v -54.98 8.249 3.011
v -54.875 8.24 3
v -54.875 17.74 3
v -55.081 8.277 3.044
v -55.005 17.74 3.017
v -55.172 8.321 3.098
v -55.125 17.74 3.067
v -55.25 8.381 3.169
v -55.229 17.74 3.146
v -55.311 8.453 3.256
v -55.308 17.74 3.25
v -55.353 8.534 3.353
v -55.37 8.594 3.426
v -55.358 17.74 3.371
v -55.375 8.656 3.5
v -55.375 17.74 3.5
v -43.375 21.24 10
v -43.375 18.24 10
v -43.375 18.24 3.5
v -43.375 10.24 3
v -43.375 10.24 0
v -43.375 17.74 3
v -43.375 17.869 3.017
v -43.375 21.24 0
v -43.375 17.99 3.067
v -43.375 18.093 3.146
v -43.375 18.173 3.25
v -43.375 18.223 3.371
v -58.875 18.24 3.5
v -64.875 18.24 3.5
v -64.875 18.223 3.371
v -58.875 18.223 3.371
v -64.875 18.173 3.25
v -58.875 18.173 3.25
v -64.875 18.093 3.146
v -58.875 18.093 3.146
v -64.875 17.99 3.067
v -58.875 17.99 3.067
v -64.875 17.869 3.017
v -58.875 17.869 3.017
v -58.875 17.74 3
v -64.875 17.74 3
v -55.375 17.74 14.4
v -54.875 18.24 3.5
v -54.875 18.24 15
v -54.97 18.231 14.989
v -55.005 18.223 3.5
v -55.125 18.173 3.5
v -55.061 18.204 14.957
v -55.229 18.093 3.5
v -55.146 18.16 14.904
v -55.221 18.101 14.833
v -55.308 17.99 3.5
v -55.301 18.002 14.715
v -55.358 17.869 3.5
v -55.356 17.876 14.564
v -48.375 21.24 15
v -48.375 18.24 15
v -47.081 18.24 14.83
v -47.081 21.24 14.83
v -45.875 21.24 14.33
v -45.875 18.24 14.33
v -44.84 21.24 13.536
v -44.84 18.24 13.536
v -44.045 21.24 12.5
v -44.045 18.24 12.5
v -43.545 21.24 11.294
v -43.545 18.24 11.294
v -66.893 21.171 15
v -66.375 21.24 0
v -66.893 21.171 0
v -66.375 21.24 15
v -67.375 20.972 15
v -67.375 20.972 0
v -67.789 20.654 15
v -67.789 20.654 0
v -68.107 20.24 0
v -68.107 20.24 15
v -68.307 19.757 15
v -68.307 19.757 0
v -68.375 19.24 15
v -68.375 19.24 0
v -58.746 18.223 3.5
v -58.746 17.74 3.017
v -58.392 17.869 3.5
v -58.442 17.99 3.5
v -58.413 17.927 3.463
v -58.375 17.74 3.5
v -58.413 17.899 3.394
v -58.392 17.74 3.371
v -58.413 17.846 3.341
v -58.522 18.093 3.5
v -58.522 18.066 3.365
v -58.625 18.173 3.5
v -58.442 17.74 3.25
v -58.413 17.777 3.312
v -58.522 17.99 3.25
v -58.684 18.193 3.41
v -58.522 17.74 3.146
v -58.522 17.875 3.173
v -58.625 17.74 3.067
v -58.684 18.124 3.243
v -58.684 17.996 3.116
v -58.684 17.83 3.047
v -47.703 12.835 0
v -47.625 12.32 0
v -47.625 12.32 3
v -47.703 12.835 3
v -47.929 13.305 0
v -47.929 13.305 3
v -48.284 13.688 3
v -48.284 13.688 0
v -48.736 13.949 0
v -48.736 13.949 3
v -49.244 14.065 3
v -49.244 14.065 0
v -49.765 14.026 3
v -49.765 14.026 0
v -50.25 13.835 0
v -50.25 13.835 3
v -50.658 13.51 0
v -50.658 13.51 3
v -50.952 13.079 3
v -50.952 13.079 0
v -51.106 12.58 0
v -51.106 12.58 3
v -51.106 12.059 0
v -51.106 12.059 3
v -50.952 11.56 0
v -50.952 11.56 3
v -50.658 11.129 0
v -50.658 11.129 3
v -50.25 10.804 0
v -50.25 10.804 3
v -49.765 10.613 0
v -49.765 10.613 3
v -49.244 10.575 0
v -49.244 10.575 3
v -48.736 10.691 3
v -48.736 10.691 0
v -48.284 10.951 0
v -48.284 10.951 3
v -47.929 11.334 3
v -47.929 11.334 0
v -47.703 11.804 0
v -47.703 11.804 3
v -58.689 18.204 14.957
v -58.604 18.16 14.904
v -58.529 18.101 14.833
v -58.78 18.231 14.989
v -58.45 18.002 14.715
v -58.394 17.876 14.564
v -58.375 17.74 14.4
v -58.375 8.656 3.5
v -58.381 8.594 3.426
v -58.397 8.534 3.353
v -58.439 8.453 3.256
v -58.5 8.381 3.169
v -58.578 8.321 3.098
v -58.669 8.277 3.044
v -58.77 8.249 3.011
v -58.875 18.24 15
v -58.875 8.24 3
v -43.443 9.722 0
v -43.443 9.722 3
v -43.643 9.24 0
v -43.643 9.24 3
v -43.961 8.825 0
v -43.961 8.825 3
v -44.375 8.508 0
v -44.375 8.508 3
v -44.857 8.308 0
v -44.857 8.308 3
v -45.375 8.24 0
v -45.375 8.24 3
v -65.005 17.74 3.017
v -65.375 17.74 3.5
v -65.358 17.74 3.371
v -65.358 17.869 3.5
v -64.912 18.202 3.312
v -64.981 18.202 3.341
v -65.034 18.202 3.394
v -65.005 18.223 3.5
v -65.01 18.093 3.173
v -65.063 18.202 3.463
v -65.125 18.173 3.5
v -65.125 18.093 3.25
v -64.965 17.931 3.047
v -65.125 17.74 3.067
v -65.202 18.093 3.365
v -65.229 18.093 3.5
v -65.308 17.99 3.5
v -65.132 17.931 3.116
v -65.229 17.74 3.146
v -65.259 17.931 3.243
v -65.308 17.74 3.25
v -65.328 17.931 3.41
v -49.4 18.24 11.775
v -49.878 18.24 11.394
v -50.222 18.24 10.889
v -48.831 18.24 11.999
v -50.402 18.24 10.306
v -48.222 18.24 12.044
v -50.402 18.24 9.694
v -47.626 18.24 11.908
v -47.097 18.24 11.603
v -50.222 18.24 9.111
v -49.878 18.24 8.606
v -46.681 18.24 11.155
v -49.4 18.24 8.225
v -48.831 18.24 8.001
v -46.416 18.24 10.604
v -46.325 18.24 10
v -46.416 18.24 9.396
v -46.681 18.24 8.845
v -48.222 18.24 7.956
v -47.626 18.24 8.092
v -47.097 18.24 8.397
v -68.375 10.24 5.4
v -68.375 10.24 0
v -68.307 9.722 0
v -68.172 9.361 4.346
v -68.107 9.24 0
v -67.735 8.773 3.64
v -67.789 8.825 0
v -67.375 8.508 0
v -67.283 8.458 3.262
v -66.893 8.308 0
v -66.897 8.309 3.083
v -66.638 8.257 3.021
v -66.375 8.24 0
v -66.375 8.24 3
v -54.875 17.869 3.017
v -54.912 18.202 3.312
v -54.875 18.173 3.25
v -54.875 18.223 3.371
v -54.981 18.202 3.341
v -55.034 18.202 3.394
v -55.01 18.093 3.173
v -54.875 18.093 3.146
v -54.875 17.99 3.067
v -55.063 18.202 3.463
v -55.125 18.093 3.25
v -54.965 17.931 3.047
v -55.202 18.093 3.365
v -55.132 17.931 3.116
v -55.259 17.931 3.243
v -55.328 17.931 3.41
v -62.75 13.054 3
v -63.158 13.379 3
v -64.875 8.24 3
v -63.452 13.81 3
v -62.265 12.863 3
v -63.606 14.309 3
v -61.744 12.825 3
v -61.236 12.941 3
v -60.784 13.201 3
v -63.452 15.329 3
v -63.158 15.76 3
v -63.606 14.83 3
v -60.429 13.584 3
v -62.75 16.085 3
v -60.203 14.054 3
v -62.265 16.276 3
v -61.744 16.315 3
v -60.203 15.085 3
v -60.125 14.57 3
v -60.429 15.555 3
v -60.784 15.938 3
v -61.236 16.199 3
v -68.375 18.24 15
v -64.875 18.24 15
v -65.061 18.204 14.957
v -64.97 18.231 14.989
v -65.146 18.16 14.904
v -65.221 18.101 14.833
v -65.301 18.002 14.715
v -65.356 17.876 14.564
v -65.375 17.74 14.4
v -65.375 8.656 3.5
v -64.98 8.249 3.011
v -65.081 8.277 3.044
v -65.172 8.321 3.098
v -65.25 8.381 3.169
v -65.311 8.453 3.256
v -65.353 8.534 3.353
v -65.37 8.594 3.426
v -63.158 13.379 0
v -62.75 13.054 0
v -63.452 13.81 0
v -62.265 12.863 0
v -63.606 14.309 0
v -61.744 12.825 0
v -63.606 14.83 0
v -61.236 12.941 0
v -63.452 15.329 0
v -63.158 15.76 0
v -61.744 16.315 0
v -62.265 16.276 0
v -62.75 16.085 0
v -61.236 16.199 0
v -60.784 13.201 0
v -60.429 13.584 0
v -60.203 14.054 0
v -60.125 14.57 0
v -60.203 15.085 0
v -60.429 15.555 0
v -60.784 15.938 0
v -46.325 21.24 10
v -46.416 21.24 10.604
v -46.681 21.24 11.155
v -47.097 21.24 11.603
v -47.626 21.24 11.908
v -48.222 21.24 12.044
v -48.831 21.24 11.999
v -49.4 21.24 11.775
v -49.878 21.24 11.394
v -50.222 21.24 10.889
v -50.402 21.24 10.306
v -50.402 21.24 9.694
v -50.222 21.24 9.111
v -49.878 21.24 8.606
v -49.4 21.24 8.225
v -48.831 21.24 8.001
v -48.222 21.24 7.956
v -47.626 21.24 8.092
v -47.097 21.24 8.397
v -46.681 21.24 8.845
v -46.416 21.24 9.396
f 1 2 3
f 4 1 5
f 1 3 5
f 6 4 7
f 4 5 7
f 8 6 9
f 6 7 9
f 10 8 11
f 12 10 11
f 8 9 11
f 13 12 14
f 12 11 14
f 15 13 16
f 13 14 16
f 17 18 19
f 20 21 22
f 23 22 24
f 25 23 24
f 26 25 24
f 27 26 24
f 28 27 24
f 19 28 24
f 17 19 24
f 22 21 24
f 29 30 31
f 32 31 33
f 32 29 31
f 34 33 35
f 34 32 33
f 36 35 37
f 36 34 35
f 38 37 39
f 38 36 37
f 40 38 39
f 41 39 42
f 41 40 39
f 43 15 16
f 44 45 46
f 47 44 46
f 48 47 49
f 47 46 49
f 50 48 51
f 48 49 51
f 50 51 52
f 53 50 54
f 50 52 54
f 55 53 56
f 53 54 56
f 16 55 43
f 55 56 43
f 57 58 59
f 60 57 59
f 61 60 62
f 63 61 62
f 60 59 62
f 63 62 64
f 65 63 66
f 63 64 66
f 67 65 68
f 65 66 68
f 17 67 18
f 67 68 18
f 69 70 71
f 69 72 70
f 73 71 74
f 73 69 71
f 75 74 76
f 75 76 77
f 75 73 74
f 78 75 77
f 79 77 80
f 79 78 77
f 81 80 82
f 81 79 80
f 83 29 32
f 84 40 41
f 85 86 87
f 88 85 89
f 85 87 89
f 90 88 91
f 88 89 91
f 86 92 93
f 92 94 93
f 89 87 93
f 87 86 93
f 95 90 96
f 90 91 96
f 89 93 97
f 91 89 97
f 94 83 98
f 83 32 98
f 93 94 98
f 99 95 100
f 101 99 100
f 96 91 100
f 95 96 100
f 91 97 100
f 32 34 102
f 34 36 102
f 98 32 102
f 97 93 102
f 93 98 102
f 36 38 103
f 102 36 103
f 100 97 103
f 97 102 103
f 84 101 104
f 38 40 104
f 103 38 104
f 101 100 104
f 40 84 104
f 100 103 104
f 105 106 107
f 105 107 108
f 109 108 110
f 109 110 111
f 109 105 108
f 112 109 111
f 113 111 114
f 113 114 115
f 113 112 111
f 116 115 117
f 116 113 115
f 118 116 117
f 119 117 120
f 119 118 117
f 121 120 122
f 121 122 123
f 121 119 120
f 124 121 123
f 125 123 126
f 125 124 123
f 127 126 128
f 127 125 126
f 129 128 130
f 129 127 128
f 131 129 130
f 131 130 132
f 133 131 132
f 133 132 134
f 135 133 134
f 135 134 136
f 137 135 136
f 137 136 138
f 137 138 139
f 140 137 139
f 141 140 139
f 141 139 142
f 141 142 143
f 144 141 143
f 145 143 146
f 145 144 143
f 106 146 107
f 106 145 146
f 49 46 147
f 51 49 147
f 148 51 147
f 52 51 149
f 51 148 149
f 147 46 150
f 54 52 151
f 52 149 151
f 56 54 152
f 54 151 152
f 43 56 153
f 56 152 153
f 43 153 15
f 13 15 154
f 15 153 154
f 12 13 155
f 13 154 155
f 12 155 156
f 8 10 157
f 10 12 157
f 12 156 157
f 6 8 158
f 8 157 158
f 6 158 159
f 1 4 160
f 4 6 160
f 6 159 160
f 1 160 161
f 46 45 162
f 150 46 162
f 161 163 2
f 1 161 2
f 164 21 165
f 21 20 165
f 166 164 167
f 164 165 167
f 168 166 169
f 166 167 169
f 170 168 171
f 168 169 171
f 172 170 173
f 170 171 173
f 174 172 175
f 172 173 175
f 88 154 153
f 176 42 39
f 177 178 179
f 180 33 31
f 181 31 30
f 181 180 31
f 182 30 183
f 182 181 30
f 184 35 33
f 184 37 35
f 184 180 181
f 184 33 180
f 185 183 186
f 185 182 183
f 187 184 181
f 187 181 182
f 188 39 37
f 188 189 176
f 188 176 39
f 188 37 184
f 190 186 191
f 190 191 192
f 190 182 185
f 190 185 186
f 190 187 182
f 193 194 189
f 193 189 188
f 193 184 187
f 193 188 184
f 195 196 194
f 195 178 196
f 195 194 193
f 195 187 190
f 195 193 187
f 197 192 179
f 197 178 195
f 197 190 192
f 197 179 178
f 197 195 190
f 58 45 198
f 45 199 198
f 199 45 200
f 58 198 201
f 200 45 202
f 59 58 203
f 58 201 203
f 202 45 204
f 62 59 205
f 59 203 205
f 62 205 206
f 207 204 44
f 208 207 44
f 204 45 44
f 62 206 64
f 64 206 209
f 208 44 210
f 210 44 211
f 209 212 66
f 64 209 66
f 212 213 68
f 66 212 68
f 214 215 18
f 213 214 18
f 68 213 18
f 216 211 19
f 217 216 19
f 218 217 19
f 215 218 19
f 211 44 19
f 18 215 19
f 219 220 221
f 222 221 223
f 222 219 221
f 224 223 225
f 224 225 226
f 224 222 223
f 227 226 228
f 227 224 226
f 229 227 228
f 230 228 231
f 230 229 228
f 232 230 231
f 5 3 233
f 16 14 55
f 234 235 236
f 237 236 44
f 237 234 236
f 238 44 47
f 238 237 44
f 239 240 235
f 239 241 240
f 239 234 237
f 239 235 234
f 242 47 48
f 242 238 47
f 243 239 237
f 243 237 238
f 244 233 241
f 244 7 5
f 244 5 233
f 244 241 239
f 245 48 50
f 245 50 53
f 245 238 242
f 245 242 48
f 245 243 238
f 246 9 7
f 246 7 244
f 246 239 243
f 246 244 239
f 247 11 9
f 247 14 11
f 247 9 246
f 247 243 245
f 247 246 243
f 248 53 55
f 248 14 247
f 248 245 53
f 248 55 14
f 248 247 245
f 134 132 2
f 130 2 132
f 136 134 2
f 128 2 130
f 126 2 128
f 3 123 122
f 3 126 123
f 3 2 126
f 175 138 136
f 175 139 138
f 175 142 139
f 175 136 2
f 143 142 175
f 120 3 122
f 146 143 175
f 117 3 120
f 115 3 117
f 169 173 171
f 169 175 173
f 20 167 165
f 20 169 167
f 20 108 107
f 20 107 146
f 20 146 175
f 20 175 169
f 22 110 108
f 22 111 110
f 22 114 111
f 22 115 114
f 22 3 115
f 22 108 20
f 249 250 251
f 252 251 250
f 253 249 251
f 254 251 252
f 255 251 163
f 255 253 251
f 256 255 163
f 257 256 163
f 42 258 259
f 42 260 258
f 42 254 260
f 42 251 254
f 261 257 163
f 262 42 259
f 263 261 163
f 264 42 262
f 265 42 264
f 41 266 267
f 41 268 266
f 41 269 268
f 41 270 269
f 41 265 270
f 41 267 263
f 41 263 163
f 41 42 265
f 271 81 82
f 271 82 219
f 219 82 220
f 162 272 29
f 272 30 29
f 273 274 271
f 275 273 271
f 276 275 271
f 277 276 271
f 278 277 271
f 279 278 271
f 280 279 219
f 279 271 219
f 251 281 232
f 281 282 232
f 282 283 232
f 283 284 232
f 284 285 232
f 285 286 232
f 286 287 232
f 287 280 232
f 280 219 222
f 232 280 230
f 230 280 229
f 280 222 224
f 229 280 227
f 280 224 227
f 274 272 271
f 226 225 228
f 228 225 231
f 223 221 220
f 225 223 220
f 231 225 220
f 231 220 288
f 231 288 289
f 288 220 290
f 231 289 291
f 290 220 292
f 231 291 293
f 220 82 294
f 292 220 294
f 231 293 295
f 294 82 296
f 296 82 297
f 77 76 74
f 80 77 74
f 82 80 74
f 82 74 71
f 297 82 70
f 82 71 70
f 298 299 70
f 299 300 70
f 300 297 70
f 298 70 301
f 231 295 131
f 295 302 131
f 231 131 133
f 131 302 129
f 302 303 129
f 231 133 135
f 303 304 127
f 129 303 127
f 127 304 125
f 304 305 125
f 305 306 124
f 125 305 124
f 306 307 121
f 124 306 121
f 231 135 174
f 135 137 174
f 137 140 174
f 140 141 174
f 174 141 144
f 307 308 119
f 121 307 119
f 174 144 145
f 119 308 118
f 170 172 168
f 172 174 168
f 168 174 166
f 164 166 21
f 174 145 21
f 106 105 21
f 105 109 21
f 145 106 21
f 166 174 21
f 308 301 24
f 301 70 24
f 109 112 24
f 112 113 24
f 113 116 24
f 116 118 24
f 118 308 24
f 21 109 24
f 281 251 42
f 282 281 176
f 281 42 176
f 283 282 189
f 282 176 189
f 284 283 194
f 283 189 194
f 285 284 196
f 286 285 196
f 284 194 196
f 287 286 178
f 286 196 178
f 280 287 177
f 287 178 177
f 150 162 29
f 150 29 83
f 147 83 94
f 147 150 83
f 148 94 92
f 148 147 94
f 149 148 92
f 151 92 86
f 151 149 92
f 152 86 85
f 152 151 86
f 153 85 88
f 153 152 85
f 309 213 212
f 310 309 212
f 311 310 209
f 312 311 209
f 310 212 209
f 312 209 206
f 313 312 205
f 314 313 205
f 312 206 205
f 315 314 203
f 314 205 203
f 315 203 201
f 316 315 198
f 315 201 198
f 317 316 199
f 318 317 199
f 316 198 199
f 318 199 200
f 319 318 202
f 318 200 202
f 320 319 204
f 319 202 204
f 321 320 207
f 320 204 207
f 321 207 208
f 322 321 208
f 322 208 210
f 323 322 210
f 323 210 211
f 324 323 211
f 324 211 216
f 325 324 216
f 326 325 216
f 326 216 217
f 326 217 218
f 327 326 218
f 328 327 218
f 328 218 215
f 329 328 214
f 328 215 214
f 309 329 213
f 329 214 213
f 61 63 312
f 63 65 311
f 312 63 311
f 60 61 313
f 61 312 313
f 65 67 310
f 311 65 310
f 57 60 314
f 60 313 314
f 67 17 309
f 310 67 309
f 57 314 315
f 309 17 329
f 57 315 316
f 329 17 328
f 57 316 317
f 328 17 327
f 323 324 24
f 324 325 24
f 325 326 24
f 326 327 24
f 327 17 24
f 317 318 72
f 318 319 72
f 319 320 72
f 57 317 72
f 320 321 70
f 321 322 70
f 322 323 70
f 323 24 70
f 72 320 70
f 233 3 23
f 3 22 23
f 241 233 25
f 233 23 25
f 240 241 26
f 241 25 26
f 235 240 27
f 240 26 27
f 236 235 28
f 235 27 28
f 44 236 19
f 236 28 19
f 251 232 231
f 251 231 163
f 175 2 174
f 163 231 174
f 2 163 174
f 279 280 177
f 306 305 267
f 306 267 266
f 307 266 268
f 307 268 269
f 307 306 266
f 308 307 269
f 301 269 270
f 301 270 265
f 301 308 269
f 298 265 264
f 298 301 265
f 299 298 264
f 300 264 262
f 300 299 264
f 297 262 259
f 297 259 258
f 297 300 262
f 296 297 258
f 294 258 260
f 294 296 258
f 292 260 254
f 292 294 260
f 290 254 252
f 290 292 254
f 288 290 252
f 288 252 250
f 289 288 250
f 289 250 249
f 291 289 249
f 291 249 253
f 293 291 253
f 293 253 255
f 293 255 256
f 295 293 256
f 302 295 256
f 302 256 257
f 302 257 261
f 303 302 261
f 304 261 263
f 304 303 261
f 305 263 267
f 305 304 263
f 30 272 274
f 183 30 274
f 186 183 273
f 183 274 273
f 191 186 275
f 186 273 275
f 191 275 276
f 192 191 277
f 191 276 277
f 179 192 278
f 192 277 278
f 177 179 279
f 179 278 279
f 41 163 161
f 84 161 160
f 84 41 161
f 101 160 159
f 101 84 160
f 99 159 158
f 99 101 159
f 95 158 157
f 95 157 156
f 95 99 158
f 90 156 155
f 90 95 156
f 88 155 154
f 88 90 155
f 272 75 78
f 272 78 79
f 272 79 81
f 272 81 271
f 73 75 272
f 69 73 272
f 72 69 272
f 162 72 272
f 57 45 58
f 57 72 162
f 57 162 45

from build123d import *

# Parameters (mm, degrees)
F0_W     = 3
F0_H     = 10
F1_DEPTH = 15
F0_W_2   = 12
F0_R     = 1.75
F0_W_3   = 7
F2_DEPTH = 3
F3_R     = 2.05
F4_DEPTH = 3
F6_DEPTH = 25.001
F7_R     = 2
F8_R     = 0.5


with BuildPart() as f1:
    # F0 (on Top) → F1 (new body)
    with BuildSketch(Plane.XY):
        Polygon((-43.3751196787, 21.2396075964), (-68.3751196787, 21.2396075964), (-68.3751196787, 18.2396075964), (-65.3751196787, 18.2396075964), (-58.3751196787, 18.2396075964), (-55.3751196787, 18.2396075964), (-43.3751196787, 18.2396075964), align=None)
        with Locations((-66.8751196787, 13.2396075964)):
            Rectangle(F0_W, F0_H)
        with Locations((-56.8751196787, 13.2396075964)):
            Rectangle(F0_W, F0_H)
    extrude(amount=F1_DEPTH)

    # F0 (on Top) → F2 (join)
    with BuildSketch(Plane.XY):
        Polygon((-43.3751196787, 21.2396075964), (-68.3751196787, 21.2396075964), (-68.3751196787, 18.2396075964), (-65.3751196787, 18.2396075964), (-58.3751196787, 18.2396075964), (-55.3751196787, 18.2396075964), (-43.3751196787, 18.2396075964), align=None)
        with Locations((-66.8751196787, 13.2396075964)):
            Rectangle(F0_W, F0_H)
        with Locations((-49.3751196787, 13.2396075964)):
            Rectangle(F0_W_2, F0_H)
        with Locations((-49.3751196787, 12.3196075964)):
            Circle(F0_R, mode=Mode.SUBTRACT)
        with Locations((-61.8751196787, 13.2396075964)):
            Rectangle(F0_W_3, F0_H)
        with Locations((-61.8751196787, 14.5696075964)):
            Circle(F0_R, mode=Mode.SUBTRACT)
        with Locations((-56.8751196787, 13.2396075964)):
            Rectangle(F0_W, F0_H)
    extrude(amount=F2_DEPTH)

    # F3 (on face) → F4 (cut)
    with BuildSketch(Plane.XZ.offset(-18.2396075964)):
        with BuildLine():
            ThreePointArc((-48.3751196787, 15), (-44.8395857727, 13.5355339059), (-43.3751196787, 10))
            Line((-43.3751196787, 10), (-43.3751196787, 15))
            Line((-43.3751196787, 15), (-48.3751196787, 15))
        make_face()
        with Locations((-48.3751196787, 10)):
            Circle(F3_R)
    extrude(amount=-F4_DEPTH, mode=Mode.SUBTRACT)

    # F5 (on face) → F6 (cut, through all)
    with BuildSketch(Plane(origin=(-68.3751196787, 0, 0), x_dir=(0, -1, 0), z_dir=(-1, 0, 0))):
        Polygon((-8.2396075964, 15), (-18.2396075964, 15), (-8.2396075964, 3), align=None)
    extrude(amount=-F6_DEPTH, mode=Mode.SUBTRACT)

    # F7
    f7_edges = [f1.edges().sort_by_distance(p)[0] for p in [
        (-68.37512, 8.239608, 1.5),
        (-43.37512, 8.239608, 1.5),
        (-68.37512, 21.239608, 7.5),
    ]]
    fillet(f7_edges, radius=F7_R)

    # F8
    f8_edges = [f1.edges().sort_by_distance(p)[0] for p in [
        (-55.37512, 13.239608, 3),
        (-49.37512, 18.239608, 3),
        (-55.37512, 18.239608, 9),
        (-65.37512, 13.239608, 3),
        (-61.87512, 18.239608, 3),
        (-65.37512, 18.239608, 9),
        (-58.37512, 18.239608, 9),
        (-58.37512, 13.239608, 3),
    ]]
    fillet(f8_edges, radius=F8_R)


solid = f1.part
